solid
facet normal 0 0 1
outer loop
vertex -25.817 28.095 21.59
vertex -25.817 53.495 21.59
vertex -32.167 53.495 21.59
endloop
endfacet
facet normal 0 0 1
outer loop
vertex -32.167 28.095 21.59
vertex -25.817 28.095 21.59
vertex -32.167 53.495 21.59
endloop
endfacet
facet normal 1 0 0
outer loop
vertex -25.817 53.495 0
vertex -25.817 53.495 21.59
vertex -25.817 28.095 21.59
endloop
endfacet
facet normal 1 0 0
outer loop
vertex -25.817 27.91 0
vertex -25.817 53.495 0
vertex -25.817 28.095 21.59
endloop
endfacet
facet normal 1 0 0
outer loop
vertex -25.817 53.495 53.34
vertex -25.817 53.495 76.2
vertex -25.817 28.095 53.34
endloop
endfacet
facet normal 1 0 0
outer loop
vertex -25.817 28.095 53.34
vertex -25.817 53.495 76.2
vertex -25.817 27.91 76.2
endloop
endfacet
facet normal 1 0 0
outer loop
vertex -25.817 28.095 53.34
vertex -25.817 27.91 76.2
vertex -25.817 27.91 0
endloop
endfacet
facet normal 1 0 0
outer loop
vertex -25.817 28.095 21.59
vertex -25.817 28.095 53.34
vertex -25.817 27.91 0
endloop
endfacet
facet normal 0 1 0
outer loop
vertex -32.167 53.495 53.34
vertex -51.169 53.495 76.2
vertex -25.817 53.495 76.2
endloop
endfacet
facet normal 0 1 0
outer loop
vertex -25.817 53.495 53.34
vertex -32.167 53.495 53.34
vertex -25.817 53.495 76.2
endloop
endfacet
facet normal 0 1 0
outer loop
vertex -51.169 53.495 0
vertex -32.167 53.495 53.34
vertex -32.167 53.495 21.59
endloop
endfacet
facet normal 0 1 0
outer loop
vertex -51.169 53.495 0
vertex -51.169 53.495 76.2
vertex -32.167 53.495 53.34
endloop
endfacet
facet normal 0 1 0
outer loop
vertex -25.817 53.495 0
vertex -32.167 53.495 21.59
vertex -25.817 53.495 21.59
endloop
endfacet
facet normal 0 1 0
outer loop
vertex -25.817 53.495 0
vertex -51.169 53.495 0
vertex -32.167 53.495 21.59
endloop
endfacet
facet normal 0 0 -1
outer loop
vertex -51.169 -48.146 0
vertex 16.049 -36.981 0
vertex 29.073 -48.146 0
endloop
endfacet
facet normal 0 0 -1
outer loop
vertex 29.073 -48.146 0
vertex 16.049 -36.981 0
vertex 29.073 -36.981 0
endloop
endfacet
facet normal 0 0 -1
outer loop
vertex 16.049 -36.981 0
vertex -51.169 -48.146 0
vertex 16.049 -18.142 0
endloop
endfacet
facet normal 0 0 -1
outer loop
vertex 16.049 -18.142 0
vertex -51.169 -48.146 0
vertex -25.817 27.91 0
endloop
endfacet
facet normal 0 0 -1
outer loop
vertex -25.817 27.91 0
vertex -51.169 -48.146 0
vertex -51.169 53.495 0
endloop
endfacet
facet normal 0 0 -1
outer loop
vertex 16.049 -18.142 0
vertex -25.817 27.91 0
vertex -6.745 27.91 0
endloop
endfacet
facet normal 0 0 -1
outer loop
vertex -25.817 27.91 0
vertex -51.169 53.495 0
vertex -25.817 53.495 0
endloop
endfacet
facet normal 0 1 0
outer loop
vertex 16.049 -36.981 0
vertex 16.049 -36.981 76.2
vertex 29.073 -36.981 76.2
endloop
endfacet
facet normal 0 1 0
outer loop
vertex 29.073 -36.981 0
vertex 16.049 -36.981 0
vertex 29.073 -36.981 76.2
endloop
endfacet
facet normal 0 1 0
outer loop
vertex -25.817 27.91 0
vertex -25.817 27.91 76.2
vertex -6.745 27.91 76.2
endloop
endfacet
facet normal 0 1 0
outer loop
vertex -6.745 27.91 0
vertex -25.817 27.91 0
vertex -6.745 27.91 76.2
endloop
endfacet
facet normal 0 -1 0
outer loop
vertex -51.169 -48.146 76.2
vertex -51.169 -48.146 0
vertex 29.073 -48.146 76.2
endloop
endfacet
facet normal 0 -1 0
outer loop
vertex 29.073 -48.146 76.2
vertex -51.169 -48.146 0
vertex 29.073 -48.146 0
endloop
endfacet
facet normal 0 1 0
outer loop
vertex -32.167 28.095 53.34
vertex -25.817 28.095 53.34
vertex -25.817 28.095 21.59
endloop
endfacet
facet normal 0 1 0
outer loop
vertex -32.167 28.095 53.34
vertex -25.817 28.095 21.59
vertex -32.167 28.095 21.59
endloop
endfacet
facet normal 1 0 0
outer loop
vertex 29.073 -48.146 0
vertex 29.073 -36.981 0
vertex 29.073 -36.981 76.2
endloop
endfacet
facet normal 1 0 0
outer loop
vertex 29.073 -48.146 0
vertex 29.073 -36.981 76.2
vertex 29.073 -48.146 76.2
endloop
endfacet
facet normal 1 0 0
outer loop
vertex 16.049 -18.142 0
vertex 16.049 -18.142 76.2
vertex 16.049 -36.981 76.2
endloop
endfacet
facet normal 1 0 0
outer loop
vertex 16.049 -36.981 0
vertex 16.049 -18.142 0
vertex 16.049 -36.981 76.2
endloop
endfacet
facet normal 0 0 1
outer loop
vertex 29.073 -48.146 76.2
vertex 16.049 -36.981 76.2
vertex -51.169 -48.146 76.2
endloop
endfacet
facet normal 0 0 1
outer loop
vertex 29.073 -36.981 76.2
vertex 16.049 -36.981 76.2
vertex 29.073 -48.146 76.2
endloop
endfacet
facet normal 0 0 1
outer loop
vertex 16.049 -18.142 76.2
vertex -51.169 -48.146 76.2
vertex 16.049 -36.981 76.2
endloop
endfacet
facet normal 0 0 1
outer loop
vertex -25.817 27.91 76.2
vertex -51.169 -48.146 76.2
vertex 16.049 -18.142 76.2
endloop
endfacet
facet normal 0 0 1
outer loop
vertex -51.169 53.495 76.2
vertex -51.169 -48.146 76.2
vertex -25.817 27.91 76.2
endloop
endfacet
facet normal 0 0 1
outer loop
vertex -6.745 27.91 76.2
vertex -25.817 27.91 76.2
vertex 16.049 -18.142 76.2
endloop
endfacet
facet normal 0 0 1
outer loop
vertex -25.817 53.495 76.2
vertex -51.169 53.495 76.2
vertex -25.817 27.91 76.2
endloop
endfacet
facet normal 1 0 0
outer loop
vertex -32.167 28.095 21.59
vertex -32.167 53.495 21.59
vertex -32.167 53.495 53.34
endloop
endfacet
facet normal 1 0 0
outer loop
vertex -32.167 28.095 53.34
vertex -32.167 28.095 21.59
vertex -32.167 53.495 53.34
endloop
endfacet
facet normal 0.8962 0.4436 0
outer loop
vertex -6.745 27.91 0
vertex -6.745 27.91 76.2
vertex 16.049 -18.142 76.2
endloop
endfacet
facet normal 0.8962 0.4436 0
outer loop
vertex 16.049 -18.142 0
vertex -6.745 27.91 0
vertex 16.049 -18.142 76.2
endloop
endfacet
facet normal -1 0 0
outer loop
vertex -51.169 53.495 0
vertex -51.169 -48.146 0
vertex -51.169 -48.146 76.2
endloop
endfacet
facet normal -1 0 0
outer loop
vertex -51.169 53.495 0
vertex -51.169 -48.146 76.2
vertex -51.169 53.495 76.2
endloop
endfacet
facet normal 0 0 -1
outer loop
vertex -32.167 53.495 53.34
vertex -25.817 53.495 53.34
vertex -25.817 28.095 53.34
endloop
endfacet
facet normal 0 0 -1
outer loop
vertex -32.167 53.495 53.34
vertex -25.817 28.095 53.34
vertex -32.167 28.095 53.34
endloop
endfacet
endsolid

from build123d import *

# Parameters (mm, degrees)
F0_W      = 89.0809036791
F0_H      = 101.640611887
F1_DEPTH  = 76.2
F3_DEPTH  = 76.201
F4_R      = 10.6888946351
F3_FACE_W = 51.3844064591
F3_FACE_H = 76.2
F5_DEPTH  = 12.7
F8_W      = 6.35
F8_H      = 31.75
F9_DEPTH  = 25.4


# Not quite as in the source:
# - a feature of the source that left no trace in its solid (it failed there, or was rolled back) is left out


with BuildPart() as f1:
    # F0 (on Top) → F1 (new body)
    with BuildSketch(Plane.XY):
        with Locations((-6.628734991, 2.674754709)):
            Rectangle(F0_W, F0_H)
    extrude(amount=F1_DEPTH)

    # F2 (on face) → F3 (cut, through all)
    with BuildSketch(Plane.XY.offset(76.2)):
        Polygon((37.9117168486, 53.4950606525), (-25.8171800524, 53.4950606525), (-25.8171800524, 27.9104653746), (-6.7450297065, 27.9104653746), (16.0485189408, -18.1418024004), (16.0485189408, -36.9813665748), (29.0734022856, -36.9813665748), (29.0734022856, -48.1455512345), (31.1666838825, -48.1455512345), (37.9117168486, -48.1455512345), align=None)
    extrude(amount=-F3_DEPTH, mode=Mode.SUBTRACT)

    # F4 (on Right) + F3_face (on face) → F5 (join)
    with BuildSketch(Plane.YZ):
        with Locations((0, 59.542324394)):
            Circle(F4_R)
    with BuildSketch(Plane(origin=(4.6517446171, 4.8843314871, 38.1), x_dir=(-0.4435888282, 0.8962304121, 0), z_dir=(0.8962304121, 0.4435888282, 0))):
        Rectangle(F3_FACE_W, F3_FACE_H)
    extrude(amount=-F5_DEPTH, dir=(1, 0, 0))

    # F8 (on face) → F9 (cut)
    with BuildSketch(Plane(origin=(0, 53.4950606525, 0), x_dir=(-1, 0, 0), z_dir=(0, 1, 0))):
        with Locations((28.9921800524, 37.465)):
            Rectangle(F8_W, F8_H)
    extrude(amount=-F9_DEPTH, mode=Mode.SUBTRACT)


solid = f1.part
